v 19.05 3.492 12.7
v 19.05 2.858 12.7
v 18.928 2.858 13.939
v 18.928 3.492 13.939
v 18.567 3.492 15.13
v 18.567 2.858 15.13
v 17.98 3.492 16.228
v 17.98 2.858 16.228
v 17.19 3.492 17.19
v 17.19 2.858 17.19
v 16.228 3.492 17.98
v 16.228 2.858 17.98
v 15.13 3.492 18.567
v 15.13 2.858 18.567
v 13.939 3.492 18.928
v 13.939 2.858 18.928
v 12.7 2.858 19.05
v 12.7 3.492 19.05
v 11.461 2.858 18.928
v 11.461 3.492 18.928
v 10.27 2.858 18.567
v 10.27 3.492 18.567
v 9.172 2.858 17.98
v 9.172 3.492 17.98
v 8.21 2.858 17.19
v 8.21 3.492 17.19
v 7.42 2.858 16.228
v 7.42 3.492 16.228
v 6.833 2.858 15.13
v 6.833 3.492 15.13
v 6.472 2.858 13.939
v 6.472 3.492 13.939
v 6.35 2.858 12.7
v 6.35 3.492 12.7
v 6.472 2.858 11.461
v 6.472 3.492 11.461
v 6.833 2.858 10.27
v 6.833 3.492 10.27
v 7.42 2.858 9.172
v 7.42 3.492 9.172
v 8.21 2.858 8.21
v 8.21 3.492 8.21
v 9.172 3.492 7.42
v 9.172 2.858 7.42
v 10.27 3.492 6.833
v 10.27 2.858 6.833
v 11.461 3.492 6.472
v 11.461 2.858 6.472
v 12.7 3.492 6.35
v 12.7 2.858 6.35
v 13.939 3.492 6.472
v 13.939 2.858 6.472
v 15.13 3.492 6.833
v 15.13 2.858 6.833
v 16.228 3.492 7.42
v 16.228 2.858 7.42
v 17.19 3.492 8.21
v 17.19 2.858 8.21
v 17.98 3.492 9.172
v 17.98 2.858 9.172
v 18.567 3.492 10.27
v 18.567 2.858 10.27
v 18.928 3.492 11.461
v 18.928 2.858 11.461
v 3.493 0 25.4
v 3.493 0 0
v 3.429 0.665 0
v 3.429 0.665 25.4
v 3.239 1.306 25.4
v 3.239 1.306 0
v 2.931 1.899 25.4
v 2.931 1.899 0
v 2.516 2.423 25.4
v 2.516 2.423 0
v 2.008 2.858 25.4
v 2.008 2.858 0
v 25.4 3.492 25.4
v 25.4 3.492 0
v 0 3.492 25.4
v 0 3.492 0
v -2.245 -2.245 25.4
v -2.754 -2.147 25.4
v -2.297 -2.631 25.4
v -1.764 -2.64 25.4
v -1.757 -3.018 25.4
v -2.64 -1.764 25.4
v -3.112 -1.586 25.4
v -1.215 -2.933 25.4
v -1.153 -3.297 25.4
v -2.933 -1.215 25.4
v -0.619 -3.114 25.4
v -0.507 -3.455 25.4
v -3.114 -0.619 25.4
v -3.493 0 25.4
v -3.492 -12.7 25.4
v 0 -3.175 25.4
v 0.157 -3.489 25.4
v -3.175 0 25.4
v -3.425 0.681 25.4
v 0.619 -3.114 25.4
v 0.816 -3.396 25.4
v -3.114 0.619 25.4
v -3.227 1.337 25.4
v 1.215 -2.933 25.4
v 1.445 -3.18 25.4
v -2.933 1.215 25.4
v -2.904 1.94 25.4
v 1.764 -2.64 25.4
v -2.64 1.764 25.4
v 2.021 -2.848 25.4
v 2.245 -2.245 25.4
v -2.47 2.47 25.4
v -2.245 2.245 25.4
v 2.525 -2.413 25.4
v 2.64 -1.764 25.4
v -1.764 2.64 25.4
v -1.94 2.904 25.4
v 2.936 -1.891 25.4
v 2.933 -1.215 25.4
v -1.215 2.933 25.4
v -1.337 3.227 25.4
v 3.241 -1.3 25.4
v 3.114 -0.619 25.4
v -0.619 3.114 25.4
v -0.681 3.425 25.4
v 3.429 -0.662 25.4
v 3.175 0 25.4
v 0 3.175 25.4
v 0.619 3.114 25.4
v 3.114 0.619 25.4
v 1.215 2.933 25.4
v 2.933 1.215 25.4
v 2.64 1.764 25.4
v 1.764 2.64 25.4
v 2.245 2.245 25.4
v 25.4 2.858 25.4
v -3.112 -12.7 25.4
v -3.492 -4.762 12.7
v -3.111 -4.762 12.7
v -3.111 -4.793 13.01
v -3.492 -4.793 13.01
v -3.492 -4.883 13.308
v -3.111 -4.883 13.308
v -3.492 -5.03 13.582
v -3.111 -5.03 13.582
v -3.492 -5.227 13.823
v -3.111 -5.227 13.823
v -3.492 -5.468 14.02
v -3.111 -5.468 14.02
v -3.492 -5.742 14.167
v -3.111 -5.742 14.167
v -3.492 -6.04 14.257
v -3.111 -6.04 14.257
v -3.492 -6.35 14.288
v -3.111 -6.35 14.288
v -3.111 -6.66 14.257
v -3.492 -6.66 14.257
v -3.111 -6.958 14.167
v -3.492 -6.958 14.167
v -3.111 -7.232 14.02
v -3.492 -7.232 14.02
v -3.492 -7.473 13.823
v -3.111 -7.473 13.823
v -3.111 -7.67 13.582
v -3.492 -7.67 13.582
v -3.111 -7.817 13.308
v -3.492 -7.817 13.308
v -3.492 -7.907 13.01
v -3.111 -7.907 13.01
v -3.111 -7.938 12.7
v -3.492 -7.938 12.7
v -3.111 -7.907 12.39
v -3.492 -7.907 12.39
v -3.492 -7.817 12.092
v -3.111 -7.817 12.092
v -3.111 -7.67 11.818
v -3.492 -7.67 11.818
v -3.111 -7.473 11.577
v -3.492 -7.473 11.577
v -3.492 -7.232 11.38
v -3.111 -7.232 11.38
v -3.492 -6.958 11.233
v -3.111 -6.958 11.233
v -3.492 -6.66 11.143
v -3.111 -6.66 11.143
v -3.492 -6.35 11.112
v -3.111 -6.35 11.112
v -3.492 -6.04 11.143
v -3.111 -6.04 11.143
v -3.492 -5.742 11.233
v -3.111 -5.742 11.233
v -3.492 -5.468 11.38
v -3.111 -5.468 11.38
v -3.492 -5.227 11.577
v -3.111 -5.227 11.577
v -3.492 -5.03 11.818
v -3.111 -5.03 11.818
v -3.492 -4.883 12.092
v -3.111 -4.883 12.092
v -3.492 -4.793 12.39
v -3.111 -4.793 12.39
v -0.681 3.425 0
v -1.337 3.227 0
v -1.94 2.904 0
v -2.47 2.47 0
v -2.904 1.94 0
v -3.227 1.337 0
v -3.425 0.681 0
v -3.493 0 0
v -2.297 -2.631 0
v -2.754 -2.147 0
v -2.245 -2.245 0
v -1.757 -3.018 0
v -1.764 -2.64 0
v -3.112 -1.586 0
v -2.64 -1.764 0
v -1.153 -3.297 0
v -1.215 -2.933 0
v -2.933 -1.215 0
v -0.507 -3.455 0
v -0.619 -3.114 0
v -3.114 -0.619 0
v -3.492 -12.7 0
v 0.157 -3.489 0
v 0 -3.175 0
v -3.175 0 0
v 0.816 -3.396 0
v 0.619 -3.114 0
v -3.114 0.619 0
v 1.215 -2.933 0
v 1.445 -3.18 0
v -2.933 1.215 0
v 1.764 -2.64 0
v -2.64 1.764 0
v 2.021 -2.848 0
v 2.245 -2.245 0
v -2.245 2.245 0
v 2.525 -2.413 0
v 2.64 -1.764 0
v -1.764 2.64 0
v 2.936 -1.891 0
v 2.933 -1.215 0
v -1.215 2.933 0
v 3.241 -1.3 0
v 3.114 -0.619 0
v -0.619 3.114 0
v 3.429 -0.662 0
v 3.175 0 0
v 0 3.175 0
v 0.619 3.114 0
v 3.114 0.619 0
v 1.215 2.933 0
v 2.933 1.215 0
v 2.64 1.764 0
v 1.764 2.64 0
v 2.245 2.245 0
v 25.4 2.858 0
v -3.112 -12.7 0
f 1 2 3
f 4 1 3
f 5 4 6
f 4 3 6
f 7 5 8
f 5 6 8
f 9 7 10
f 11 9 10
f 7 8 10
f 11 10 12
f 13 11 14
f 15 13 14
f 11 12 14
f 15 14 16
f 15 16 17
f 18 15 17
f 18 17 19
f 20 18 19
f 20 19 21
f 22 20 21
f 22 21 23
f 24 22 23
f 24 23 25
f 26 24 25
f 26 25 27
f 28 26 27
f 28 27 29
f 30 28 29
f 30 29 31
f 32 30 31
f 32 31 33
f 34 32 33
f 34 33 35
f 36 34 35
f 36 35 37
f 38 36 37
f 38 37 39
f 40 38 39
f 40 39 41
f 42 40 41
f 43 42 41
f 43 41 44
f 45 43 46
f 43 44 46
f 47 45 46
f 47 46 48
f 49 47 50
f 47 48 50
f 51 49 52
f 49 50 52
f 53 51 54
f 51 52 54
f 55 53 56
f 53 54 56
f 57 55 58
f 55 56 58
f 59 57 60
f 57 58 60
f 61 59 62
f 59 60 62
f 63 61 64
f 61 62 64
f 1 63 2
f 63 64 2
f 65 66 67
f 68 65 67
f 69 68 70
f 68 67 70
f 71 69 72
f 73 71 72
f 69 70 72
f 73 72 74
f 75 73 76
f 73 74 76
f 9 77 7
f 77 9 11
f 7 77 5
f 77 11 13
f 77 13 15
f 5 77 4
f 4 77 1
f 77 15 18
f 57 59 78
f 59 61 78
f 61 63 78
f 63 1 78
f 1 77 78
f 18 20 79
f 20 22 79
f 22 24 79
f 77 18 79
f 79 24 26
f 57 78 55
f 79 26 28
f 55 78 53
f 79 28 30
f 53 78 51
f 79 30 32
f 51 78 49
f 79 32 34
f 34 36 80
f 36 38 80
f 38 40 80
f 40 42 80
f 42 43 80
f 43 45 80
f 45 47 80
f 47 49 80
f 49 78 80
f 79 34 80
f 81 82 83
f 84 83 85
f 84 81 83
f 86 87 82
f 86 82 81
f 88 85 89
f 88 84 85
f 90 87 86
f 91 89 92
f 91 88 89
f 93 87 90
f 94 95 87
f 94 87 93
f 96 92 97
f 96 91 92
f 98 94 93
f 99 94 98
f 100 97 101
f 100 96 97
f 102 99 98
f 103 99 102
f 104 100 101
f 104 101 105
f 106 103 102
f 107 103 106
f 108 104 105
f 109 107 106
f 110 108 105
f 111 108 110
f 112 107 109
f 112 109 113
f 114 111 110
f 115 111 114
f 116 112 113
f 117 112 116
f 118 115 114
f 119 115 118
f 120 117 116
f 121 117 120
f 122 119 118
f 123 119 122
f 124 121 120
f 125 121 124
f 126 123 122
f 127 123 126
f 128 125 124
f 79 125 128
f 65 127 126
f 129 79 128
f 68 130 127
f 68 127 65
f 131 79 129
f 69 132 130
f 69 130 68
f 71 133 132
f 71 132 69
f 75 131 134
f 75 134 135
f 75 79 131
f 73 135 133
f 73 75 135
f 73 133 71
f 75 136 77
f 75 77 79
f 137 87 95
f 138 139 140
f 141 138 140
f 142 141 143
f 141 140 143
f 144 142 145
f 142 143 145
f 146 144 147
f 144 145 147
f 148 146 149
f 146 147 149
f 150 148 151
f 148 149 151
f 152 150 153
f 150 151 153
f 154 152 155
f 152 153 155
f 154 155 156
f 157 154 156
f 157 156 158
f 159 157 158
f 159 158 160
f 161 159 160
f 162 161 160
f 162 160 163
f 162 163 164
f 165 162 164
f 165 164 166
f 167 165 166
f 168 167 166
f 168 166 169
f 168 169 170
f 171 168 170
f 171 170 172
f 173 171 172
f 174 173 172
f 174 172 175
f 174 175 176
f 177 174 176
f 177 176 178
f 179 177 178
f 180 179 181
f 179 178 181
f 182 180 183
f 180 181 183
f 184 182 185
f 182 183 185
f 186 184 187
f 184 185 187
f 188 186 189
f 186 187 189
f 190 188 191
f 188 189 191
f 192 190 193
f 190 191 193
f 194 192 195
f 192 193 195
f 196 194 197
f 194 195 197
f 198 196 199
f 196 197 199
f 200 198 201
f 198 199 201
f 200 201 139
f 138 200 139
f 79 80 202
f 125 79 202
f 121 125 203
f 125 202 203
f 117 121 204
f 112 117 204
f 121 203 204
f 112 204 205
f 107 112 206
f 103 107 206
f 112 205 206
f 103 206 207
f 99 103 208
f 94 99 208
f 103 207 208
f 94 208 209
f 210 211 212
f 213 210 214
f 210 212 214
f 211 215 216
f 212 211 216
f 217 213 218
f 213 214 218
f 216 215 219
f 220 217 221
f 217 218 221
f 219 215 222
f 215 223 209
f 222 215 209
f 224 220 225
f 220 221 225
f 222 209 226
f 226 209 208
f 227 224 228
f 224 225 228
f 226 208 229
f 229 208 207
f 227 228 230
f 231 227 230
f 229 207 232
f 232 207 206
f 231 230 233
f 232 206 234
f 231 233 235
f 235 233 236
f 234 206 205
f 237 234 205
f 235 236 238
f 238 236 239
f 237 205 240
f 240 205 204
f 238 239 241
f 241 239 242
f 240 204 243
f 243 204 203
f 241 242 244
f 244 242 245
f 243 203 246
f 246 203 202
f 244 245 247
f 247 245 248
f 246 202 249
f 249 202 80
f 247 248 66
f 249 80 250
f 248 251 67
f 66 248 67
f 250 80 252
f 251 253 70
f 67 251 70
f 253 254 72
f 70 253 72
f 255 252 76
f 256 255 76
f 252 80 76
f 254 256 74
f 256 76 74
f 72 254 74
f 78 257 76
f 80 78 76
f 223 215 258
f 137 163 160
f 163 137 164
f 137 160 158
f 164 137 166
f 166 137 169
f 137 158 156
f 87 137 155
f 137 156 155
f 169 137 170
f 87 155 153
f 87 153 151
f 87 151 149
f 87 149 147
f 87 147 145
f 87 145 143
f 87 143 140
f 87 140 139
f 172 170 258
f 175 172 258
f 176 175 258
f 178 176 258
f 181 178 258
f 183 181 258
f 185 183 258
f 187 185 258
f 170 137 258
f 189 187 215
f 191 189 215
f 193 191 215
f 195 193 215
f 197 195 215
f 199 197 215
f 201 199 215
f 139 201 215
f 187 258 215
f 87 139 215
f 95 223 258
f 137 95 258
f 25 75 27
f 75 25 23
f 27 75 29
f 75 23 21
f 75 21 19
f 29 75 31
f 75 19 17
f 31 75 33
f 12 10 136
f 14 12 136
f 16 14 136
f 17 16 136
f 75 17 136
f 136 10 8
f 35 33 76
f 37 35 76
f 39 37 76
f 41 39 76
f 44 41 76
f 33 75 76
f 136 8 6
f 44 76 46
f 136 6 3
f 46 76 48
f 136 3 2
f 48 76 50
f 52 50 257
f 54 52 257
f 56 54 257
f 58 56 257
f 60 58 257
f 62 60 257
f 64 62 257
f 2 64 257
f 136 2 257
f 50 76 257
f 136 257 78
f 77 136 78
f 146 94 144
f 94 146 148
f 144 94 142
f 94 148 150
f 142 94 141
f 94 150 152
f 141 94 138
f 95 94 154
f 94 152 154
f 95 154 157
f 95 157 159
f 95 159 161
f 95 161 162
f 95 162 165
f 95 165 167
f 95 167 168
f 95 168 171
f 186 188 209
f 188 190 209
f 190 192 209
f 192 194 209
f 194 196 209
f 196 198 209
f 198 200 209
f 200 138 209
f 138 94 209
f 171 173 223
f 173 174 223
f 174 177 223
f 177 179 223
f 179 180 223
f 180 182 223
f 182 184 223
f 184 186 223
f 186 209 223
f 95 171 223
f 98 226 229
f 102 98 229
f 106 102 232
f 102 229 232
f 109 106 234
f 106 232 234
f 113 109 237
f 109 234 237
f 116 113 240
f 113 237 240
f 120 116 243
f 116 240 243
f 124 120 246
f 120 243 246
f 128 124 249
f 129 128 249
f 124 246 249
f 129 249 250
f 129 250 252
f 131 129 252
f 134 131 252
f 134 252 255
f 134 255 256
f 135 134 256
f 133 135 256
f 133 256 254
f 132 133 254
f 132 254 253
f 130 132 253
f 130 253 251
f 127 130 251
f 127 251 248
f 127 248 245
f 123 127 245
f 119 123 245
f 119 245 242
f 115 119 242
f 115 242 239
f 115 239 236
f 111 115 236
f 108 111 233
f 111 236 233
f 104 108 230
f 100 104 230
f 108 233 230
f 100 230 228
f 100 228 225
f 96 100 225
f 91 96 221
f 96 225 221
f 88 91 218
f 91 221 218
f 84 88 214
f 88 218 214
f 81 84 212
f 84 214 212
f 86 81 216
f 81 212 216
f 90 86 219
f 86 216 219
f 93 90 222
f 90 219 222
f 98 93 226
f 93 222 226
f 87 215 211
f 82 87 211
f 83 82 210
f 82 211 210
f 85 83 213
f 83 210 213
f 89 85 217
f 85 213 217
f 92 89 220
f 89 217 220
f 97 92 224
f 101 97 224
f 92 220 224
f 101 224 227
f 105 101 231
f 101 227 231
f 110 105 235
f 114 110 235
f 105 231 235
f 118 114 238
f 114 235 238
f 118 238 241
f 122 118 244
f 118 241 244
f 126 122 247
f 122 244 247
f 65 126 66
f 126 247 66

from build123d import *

# Parameters (mm, degrees)
F1_DEPTH = 25.4
F3_D     = 3.175
F5_D     = 12.7
F7_D     = 6.35


with BuildPart() as f1:
    # F0 (on Top) → F1 (new body)
    with BuildSketch(Plane.XY):
        with BuildLine():
            ThreePointArc((-3.1115, -1.586229), (0.815672, -3.395914), (3.4925, 0))
            ThreePointArc((3.4925, 0), (3.099247, 1.61004), (2.008046, 2.8575))
            ThreePointArc((2.008046, 2.8575), (1.053028, 3.329968), (0, 3.4925))
            ThreePointArc((0, 3.4925), (-2.46957, 2.46957), (-3.4925, 0))
            ThreePointArc((-3.4925, 0), (-3.395914, -0.815672), (-3.1115, -1.586229))
        make_face()
        with BuildLine():
            ThreePointArc((0, 3.4925), (1.053028, 3.329968), (2.008046, 2.8575))
            Line((2.008046, 2.8575), (25.4, 2.8575))
            Line((25.4, 2.8575), (25.4, 3.4925))
            Line((25.4, 3.4925), (0, 3.4925))
        make_face()
        with BuildLine():
            Line((-3.1115, -12.7), (-3.1115, -1.586229))
            ThreePointArc((-3.1115, -1.586229), (-3.395914, -0.815672), (-3.4925, 0))
            Line((-3.4925, 0), (-3.4925, -12.7))
            Line((-3.4925, -12.7), (-3.1115, -12.7))
        make_face()
    extrude(amount=F1_DEPTH)

    # F3 (through all)
    with Locations(Plane(origin=(-3.4925, 0, 0), x_dir=(0, -1, 0), z_dir=(-1, 0, 0))):
        with Locations((6.35, 12.7)):
            Hole(F3_D / 2)

    # F5 (through all)
    with Locations(Plane(origin=(0, 3.4925, 0), x_dir=(-1, 0, 0), z_dir=(0, 1, 0))):
        with Locations((-12.7, 12.7)):
            Hole(F5_D / 2)

    # F7 (through all)
    with Locations(Plane.XY.offset(25.4)):
        with Locations((0, 0)):
            Hole(F7_D / 2)


solid = f1.part
